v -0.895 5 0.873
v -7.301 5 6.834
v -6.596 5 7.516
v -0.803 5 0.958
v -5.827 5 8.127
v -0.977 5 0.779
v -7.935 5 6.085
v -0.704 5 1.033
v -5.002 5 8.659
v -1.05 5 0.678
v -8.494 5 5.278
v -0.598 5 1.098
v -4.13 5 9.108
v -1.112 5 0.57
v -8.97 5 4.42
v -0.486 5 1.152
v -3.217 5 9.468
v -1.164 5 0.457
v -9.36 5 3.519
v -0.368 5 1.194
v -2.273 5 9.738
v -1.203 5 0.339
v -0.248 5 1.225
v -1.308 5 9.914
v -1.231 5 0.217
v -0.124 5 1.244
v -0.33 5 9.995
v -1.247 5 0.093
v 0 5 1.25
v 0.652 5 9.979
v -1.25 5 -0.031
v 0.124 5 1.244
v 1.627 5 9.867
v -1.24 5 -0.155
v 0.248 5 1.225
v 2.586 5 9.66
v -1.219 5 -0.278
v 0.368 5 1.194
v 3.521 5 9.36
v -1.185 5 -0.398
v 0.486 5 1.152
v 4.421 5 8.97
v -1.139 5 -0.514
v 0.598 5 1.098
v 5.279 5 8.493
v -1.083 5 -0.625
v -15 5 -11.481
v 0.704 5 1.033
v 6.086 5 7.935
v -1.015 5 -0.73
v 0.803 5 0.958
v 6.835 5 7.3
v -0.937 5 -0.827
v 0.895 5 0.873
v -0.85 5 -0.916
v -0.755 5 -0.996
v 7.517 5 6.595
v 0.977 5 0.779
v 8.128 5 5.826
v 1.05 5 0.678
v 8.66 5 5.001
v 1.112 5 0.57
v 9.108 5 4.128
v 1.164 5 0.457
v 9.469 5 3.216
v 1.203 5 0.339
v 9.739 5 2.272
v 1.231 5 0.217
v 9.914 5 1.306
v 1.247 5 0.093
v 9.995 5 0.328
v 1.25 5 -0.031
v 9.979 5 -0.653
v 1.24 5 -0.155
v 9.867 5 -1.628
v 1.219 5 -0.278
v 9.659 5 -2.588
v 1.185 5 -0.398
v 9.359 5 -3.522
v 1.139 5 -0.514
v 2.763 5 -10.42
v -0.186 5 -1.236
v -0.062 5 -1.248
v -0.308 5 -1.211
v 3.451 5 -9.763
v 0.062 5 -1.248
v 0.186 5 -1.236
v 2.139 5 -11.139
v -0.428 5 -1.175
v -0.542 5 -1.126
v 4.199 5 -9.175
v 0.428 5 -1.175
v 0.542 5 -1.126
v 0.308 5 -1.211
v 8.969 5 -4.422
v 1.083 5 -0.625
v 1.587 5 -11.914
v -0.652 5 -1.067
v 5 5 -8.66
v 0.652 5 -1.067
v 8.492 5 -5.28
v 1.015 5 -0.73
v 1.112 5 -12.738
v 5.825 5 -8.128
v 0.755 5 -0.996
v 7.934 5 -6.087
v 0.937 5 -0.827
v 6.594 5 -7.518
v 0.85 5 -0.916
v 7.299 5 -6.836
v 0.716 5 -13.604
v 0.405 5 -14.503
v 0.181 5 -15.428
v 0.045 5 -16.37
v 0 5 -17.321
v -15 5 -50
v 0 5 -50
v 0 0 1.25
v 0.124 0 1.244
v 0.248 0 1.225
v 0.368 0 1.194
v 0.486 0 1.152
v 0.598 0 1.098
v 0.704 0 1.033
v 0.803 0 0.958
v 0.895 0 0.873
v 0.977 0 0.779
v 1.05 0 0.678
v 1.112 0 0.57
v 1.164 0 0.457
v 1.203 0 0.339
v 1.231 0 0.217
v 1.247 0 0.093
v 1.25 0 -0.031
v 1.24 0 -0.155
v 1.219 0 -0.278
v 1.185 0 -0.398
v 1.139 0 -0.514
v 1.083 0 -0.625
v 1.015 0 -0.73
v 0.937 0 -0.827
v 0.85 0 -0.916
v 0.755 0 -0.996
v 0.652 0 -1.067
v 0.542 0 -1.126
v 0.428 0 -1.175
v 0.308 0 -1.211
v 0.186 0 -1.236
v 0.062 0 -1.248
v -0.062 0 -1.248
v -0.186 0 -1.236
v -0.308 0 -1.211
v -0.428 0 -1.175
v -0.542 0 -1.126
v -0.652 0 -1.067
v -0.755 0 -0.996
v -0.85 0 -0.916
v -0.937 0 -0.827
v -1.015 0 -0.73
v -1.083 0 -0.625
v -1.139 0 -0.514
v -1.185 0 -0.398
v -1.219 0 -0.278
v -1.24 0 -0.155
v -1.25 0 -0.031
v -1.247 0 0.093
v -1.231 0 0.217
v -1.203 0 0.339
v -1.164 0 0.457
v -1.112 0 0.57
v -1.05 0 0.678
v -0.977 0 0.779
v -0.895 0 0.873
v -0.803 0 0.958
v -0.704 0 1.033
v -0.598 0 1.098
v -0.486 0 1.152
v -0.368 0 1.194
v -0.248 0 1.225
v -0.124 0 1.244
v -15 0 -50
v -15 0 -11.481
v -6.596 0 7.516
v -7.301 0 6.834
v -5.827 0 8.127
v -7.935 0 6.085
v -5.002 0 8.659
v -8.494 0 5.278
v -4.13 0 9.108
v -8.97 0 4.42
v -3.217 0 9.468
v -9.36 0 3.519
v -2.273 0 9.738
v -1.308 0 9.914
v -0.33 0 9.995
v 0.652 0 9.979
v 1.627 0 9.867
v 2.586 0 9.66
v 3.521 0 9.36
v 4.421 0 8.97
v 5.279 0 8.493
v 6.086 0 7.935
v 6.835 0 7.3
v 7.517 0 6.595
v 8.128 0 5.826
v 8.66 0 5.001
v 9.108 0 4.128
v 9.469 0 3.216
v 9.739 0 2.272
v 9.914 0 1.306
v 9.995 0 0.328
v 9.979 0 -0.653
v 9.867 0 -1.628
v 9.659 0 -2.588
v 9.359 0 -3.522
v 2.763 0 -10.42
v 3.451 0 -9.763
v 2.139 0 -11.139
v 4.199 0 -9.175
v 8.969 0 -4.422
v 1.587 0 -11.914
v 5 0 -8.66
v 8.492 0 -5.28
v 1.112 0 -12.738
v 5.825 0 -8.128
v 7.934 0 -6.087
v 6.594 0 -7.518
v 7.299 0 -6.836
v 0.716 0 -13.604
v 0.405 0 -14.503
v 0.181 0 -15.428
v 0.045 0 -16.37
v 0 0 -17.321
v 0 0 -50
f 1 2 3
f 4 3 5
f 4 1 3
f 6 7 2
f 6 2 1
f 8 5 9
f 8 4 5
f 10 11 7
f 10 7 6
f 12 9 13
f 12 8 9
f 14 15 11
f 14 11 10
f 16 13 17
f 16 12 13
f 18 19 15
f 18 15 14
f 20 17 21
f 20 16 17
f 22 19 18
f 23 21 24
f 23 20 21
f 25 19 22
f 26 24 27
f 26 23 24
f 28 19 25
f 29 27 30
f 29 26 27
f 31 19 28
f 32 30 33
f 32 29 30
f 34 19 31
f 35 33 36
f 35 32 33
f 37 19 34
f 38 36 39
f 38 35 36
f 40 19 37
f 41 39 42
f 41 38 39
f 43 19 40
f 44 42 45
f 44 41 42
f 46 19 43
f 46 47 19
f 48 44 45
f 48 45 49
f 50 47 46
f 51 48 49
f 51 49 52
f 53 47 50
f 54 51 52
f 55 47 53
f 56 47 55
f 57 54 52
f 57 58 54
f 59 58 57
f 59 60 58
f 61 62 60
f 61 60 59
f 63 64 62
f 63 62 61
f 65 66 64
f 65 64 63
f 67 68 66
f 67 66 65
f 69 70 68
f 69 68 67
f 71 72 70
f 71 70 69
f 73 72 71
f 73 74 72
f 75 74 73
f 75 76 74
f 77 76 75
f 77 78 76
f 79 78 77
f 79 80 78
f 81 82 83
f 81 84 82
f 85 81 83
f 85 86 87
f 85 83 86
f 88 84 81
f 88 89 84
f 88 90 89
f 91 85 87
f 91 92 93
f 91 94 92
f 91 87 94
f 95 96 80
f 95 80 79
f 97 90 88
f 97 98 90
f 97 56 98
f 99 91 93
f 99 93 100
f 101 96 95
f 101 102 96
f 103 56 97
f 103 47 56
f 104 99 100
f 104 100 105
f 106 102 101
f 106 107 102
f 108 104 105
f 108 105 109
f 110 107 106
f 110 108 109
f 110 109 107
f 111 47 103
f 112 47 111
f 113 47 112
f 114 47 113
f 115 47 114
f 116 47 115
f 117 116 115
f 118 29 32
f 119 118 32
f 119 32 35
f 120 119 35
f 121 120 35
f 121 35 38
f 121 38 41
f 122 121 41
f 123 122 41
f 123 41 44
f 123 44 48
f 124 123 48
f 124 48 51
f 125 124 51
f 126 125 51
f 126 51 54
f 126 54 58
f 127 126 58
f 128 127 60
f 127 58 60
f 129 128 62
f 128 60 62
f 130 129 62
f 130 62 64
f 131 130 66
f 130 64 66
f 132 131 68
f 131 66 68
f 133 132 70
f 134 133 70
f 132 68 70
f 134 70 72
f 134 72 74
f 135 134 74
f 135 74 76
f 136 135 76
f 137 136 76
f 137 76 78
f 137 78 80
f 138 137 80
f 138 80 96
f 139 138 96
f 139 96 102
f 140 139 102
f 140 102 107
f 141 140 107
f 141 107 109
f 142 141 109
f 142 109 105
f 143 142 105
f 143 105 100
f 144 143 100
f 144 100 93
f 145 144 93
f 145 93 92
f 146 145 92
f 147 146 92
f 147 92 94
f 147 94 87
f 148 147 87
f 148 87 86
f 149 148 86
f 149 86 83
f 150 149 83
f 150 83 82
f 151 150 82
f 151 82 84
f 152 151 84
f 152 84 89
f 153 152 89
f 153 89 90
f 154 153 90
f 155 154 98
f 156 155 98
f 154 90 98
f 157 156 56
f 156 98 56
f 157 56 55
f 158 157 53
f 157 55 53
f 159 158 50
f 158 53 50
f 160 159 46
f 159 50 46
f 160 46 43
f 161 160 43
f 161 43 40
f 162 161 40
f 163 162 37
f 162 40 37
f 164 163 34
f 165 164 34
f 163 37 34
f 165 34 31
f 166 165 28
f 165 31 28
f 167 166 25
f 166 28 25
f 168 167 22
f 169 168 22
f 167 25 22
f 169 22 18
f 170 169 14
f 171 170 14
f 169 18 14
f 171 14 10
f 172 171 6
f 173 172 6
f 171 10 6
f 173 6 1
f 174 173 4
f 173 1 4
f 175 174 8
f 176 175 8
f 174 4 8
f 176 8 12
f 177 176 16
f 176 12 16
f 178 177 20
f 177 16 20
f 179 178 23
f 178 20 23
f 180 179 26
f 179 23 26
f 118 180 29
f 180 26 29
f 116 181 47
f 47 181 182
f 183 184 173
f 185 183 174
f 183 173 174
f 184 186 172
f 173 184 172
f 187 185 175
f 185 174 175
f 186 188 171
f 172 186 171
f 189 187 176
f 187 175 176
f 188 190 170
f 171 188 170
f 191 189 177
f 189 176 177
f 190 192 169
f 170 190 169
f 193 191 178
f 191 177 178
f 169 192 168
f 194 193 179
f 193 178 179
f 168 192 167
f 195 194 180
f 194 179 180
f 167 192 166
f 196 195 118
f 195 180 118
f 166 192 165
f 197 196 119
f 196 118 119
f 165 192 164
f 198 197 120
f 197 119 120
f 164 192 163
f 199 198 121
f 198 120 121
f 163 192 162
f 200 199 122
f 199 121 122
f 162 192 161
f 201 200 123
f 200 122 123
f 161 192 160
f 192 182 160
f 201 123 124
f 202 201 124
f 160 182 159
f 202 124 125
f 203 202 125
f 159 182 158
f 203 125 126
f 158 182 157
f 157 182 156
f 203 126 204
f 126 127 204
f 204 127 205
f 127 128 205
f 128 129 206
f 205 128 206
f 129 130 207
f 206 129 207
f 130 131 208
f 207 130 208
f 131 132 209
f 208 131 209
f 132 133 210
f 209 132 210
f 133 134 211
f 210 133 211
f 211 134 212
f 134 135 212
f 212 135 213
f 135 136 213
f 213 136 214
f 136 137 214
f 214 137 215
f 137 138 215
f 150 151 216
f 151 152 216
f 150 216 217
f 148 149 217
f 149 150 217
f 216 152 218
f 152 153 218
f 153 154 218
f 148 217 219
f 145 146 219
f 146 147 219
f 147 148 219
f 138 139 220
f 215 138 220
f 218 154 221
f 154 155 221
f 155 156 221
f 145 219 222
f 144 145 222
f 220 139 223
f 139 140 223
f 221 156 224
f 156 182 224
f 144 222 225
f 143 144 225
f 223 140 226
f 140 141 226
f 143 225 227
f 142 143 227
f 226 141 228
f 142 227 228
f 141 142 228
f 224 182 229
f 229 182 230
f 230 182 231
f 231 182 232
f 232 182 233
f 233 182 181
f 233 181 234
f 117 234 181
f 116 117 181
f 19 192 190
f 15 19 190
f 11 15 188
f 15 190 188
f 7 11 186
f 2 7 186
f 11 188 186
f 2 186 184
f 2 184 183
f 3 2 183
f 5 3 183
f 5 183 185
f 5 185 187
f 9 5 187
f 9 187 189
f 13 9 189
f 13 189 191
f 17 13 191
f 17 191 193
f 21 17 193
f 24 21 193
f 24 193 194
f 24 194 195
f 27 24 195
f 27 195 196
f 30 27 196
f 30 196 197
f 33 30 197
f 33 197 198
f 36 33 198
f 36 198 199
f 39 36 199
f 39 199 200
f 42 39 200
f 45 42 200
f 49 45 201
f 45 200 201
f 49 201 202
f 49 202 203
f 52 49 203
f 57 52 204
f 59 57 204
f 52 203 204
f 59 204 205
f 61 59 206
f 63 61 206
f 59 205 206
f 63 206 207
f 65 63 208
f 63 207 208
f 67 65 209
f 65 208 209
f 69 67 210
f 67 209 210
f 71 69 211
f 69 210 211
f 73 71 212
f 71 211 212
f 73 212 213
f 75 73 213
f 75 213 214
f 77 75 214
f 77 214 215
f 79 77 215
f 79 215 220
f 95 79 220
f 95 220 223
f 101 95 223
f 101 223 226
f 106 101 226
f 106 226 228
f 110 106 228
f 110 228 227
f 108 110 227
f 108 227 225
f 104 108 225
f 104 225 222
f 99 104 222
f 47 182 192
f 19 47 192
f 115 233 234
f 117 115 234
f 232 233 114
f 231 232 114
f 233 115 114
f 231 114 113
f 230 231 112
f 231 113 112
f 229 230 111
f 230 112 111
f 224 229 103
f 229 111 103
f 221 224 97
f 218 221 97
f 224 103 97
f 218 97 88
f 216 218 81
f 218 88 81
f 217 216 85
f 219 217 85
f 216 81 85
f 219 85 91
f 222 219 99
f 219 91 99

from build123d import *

# Parameters (mm, degrees)
BOSS_EXTRUDE1_DEPTH = 5
FILLET1_R           = 10
SKETCH2_R           = 1.25
CUT_EXTRUDE1_DEPTH  = 53.440442409


with BuildPart() as part:
    # Sketch1 → Boss-Extrude1 (new body)
    with BuildSketch(Plane(origin=(0, 0, 0), x_dir=(1, 0, 0), z_dir=(0, 1, 0))):
        with BuildLine():
            Line((0, 10), (0, 50))
            Line((0, 50), (-15, 50))
            Line((-15, 50), (-15, 11.480705826))
            Line((-15, 11.480705826), (-9.360265408, -3.519294174))
            ThreePointArc((-9.360265408, -3.519294174), (8.221707297, -5.692409782), (0, 10))
        make_face()
    extrude(amount=BOSS_EXTRUDE1_DEPTH)

    # Fillet1
    fillet1_edges = [part.edges().sort_by_distance(p)[0] for p in [
        (0, 2.5, -10),
    ]]
    fillet(fillet1_edges, radius=FILLET1_R)

    # Sketch2 → Cut-Extrude1 (cut, through all)
    with BuildSketch(Plane(origin=(0, 5, 0), x_dir=(1, 0, 0), z_dir=(0, 1, 0))):
        with Locations(Location((0, 0, 0), (0, 0, 270))):
            Circle(SKETCH2_R)
    extrude(amount=-CUT_EXTRUDE1_DEPTH, mode=Mode.SUBTRACT)


solid = part.part
